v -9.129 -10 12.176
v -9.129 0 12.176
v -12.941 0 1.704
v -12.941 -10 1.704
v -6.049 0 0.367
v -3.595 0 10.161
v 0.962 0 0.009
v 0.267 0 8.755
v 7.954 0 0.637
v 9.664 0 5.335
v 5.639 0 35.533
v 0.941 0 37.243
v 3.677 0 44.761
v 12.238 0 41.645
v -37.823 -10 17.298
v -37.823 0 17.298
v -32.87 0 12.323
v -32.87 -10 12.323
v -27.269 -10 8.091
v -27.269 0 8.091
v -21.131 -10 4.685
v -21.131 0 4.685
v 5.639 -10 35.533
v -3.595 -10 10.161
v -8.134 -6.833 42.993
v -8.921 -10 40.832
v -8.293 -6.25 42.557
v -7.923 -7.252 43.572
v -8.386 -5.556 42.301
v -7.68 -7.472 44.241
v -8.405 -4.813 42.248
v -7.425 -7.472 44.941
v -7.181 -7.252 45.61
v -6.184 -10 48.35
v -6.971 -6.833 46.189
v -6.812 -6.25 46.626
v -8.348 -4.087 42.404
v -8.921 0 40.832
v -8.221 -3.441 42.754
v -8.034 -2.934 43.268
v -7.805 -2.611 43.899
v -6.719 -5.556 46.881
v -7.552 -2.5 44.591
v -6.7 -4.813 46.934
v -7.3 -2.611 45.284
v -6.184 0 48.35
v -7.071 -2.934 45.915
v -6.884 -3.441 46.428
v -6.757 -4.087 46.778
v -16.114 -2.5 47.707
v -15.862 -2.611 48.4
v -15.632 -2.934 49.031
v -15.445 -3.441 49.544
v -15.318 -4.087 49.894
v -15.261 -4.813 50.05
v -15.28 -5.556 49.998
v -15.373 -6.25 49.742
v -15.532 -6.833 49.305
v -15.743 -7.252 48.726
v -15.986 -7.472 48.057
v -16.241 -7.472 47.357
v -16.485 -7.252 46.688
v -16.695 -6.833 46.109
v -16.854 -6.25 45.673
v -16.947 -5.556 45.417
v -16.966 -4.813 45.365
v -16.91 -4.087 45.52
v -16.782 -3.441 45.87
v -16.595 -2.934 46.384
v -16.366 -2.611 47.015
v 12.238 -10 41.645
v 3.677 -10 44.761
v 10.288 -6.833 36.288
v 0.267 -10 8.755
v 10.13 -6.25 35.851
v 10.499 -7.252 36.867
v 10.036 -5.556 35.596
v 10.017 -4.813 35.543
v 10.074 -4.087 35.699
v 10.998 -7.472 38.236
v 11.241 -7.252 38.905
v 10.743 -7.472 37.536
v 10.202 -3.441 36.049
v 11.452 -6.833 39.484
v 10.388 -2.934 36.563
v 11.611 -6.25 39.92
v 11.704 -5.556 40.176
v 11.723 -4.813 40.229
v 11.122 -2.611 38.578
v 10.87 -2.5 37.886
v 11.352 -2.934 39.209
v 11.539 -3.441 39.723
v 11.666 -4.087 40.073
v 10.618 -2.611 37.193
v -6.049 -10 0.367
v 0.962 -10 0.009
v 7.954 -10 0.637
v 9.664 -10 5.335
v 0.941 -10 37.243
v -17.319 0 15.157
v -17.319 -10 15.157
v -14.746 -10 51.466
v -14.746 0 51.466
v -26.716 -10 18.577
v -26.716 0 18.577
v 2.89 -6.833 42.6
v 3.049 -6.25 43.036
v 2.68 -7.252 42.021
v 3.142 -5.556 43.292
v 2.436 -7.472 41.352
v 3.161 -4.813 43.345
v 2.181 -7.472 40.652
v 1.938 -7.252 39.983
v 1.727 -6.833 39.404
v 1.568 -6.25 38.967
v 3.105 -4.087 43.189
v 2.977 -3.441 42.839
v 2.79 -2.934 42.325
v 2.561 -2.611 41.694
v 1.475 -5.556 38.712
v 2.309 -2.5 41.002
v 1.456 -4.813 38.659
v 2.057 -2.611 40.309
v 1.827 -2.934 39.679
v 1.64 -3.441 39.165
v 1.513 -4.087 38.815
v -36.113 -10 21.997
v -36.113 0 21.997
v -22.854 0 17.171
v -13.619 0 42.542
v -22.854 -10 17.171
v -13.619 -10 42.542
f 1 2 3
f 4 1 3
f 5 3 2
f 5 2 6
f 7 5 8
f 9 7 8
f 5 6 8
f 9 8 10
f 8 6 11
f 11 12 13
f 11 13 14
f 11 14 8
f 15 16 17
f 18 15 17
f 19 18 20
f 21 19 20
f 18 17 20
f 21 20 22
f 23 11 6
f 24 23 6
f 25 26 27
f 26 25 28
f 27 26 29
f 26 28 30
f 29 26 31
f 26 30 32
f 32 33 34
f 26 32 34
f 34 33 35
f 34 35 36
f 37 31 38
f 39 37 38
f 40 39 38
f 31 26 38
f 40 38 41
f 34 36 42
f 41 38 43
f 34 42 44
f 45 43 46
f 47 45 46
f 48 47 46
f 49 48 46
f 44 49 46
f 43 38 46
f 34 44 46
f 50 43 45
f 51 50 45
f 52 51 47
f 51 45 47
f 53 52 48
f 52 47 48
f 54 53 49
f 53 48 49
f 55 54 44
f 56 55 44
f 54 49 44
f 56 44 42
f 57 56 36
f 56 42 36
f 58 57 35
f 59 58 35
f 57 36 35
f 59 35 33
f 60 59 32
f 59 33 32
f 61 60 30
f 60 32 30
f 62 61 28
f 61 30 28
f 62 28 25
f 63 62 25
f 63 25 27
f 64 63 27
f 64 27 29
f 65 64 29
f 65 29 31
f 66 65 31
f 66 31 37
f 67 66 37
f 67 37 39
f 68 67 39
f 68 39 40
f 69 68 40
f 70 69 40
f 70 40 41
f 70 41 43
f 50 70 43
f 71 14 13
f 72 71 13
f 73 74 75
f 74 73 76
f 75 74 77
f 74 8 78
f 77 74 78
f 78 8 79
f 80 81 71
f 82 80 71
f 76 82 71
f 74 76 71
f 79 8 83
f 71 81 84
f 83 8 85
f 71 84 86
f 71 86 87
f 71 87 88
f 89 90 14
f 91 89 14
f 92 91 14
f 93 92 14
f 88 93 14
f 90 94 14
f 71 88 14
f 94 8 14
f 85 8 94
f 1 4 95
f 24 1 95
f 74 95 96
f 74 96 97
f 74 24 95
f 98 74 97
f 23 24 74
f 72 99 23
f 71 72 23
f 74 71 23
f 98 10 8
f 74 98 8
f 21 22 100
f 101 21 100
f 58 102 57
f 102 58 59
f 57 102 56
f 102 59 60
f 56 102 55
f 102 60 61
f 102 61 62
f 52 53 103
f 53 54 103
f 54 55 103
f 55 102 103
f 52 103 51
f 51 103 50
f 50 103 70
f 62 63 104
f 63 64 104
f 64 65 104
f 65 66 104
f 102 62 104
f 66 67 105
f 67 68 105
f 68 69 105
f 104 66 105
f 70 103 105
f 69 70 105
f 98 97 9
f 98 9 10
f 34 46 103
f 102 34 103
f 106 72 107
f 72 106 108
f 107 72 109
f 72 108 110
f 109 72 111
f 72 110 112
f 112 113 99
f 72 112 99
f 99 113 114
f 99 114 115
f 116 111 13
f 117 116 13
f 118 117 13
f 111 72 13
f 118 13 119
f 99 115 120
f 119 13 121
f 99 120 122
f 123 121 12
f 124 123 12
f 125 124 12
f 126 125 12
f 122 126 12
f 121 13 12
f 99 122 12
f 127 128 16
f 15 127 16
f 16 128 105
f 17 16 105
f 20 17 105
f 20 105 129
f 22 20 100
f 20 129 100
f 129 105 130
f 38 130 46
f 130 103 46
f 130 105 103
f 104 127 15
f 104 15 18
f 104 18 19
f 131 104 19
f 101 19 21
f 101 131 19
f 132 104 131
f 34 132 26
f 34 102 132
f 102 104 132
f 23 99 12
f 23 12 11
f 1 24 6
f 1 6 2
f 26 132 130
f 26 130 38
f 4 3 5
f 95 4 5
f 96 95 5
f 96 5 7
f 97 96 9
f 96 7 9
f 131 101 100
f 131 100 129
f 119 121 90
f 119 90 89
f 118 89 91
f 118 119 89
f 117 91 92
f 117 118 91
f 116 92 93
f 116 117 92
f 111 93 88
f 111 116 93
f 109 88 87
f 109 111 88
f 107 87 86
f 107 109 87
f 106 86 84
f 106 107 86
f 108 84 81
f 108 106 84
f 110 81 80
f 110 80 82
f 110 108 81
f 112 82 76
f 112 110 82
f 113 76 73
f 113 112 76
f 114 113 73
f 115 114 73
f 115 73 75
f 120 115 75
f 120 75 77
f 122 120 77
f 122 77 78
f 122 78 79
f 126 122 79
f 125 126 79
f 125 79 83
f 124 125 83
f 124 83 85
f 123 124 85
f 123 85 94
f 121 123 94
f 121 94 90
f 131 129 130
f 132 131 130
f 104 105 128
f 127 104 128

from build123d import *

# Parameters (mm, degrees)
F1_DEPTH      = 10
F2_R          = 2.5
F3_DEPTH      = 30.7976981307
F3_DEPTH_BACK = 19.6048505534


with BuildPart() as f1:
    # F0 (on Front) → F1 (new body)
    with BuildSketch(Plane.XZ):
        with BuildLine():
            Line((-36.1133000789, 21.9969287017), (-37.8234007955, 17.2984655978))
            ThreePointArc((-37.8234007955, 17.2984655978), (-30.1443214472, 10.1086490015), (-21.130913087, 4.6846106482))
            Line((-21.130913087, 4.6846106482), (-17.3194476632, 15.1565258352))
            Line((-17.3194476632, 15.1565258352), (-22.853557124, 17.1707769521))
            Line((-22.853557124, 17.1707769521), (-26.7163738711, 18.5767272685))
            Line((-26.7163738711, 18.5767272685), (-36.1133000789, 21.9969287017))
        make_face()
        Polygon((-14.7456688547, 51.465968996), (-26.7163738711, 18.5767272685), (-22.853557124, 17.1707769521), (-13.6190132542, 42.5424777133), (-8.9205501503, 40.8323769967), (-6.1843890037, 48.349917963), align=None)
    extrude(amount=F1_DEPTH)


with BuildPart() as f1b:
    # F0 (on Front) → F1, piece 2 (new body)
    with BuildSketch(Plane.XZ):
        Polygon((12.238144393, 41.6446641668), (3.676864542, 44.7607151998), (0.9407033954, 37.2431742335), (5.6391664993, 35.5330735169), (-3.5953773705, 10.1613727557), (0.2674393766, 8.7554224393), align=None)
        with BuildLine():
            Line((9.6643655844, 5.3352210061), (0.2674393766, 8.7554224393))
            Line((0.2674393766, 8.7554224393), (-3.5953773705, 10.1613727557))
            Line((-3.5953773705, 10.1613727557), (-9.1294868313, 12.1756238726))
            Line((-9.1294868313, 12.1756238726), (-12.9409522551, 1.7037086855))
            ThreePointArc((-12.9409522551, 1.7037086855), (-2.5497762193, 0.0650559104), (7.9542648678, 0.6367579021))
            Line((7.9542648678, 0.6367579021), (9.6643655844, 5.3352210061))
        make_face()
    extrude(amount=F1_DEPTH)


with BuildPart() as f3_tool:
    # F2 (on face) → F3 (new body, two sides)
    with BuildSketch(Plane(origin=(-21.000317015, 0, 7.6434903036), x_dir=(0, 1, 0), z_dir=(0.9396926208, 0, -0.3420201433))) as f3_sk:
        with Locations((-5, 39.318875512)):
            Circle(F2_R)
    extrude(amount=-F3_DEPTH)
    extrude(f3_sk.sketch, amount=F3_DEPTH_BACK)


with BuildPart() as f1_1:
    add(f1.part)

    # F3: cut by f3_tool
    add(f3_tool.part, mode=Mode.SUBTRACT)


with BuildPart() as f1b_1:
    add(f1b.part)

    # F3: cut by f3_tool
    add(f3_tool.part, mode=Mode.SUBTRACT)


solid = Compound([f1_1.part, f1b_1.part])
